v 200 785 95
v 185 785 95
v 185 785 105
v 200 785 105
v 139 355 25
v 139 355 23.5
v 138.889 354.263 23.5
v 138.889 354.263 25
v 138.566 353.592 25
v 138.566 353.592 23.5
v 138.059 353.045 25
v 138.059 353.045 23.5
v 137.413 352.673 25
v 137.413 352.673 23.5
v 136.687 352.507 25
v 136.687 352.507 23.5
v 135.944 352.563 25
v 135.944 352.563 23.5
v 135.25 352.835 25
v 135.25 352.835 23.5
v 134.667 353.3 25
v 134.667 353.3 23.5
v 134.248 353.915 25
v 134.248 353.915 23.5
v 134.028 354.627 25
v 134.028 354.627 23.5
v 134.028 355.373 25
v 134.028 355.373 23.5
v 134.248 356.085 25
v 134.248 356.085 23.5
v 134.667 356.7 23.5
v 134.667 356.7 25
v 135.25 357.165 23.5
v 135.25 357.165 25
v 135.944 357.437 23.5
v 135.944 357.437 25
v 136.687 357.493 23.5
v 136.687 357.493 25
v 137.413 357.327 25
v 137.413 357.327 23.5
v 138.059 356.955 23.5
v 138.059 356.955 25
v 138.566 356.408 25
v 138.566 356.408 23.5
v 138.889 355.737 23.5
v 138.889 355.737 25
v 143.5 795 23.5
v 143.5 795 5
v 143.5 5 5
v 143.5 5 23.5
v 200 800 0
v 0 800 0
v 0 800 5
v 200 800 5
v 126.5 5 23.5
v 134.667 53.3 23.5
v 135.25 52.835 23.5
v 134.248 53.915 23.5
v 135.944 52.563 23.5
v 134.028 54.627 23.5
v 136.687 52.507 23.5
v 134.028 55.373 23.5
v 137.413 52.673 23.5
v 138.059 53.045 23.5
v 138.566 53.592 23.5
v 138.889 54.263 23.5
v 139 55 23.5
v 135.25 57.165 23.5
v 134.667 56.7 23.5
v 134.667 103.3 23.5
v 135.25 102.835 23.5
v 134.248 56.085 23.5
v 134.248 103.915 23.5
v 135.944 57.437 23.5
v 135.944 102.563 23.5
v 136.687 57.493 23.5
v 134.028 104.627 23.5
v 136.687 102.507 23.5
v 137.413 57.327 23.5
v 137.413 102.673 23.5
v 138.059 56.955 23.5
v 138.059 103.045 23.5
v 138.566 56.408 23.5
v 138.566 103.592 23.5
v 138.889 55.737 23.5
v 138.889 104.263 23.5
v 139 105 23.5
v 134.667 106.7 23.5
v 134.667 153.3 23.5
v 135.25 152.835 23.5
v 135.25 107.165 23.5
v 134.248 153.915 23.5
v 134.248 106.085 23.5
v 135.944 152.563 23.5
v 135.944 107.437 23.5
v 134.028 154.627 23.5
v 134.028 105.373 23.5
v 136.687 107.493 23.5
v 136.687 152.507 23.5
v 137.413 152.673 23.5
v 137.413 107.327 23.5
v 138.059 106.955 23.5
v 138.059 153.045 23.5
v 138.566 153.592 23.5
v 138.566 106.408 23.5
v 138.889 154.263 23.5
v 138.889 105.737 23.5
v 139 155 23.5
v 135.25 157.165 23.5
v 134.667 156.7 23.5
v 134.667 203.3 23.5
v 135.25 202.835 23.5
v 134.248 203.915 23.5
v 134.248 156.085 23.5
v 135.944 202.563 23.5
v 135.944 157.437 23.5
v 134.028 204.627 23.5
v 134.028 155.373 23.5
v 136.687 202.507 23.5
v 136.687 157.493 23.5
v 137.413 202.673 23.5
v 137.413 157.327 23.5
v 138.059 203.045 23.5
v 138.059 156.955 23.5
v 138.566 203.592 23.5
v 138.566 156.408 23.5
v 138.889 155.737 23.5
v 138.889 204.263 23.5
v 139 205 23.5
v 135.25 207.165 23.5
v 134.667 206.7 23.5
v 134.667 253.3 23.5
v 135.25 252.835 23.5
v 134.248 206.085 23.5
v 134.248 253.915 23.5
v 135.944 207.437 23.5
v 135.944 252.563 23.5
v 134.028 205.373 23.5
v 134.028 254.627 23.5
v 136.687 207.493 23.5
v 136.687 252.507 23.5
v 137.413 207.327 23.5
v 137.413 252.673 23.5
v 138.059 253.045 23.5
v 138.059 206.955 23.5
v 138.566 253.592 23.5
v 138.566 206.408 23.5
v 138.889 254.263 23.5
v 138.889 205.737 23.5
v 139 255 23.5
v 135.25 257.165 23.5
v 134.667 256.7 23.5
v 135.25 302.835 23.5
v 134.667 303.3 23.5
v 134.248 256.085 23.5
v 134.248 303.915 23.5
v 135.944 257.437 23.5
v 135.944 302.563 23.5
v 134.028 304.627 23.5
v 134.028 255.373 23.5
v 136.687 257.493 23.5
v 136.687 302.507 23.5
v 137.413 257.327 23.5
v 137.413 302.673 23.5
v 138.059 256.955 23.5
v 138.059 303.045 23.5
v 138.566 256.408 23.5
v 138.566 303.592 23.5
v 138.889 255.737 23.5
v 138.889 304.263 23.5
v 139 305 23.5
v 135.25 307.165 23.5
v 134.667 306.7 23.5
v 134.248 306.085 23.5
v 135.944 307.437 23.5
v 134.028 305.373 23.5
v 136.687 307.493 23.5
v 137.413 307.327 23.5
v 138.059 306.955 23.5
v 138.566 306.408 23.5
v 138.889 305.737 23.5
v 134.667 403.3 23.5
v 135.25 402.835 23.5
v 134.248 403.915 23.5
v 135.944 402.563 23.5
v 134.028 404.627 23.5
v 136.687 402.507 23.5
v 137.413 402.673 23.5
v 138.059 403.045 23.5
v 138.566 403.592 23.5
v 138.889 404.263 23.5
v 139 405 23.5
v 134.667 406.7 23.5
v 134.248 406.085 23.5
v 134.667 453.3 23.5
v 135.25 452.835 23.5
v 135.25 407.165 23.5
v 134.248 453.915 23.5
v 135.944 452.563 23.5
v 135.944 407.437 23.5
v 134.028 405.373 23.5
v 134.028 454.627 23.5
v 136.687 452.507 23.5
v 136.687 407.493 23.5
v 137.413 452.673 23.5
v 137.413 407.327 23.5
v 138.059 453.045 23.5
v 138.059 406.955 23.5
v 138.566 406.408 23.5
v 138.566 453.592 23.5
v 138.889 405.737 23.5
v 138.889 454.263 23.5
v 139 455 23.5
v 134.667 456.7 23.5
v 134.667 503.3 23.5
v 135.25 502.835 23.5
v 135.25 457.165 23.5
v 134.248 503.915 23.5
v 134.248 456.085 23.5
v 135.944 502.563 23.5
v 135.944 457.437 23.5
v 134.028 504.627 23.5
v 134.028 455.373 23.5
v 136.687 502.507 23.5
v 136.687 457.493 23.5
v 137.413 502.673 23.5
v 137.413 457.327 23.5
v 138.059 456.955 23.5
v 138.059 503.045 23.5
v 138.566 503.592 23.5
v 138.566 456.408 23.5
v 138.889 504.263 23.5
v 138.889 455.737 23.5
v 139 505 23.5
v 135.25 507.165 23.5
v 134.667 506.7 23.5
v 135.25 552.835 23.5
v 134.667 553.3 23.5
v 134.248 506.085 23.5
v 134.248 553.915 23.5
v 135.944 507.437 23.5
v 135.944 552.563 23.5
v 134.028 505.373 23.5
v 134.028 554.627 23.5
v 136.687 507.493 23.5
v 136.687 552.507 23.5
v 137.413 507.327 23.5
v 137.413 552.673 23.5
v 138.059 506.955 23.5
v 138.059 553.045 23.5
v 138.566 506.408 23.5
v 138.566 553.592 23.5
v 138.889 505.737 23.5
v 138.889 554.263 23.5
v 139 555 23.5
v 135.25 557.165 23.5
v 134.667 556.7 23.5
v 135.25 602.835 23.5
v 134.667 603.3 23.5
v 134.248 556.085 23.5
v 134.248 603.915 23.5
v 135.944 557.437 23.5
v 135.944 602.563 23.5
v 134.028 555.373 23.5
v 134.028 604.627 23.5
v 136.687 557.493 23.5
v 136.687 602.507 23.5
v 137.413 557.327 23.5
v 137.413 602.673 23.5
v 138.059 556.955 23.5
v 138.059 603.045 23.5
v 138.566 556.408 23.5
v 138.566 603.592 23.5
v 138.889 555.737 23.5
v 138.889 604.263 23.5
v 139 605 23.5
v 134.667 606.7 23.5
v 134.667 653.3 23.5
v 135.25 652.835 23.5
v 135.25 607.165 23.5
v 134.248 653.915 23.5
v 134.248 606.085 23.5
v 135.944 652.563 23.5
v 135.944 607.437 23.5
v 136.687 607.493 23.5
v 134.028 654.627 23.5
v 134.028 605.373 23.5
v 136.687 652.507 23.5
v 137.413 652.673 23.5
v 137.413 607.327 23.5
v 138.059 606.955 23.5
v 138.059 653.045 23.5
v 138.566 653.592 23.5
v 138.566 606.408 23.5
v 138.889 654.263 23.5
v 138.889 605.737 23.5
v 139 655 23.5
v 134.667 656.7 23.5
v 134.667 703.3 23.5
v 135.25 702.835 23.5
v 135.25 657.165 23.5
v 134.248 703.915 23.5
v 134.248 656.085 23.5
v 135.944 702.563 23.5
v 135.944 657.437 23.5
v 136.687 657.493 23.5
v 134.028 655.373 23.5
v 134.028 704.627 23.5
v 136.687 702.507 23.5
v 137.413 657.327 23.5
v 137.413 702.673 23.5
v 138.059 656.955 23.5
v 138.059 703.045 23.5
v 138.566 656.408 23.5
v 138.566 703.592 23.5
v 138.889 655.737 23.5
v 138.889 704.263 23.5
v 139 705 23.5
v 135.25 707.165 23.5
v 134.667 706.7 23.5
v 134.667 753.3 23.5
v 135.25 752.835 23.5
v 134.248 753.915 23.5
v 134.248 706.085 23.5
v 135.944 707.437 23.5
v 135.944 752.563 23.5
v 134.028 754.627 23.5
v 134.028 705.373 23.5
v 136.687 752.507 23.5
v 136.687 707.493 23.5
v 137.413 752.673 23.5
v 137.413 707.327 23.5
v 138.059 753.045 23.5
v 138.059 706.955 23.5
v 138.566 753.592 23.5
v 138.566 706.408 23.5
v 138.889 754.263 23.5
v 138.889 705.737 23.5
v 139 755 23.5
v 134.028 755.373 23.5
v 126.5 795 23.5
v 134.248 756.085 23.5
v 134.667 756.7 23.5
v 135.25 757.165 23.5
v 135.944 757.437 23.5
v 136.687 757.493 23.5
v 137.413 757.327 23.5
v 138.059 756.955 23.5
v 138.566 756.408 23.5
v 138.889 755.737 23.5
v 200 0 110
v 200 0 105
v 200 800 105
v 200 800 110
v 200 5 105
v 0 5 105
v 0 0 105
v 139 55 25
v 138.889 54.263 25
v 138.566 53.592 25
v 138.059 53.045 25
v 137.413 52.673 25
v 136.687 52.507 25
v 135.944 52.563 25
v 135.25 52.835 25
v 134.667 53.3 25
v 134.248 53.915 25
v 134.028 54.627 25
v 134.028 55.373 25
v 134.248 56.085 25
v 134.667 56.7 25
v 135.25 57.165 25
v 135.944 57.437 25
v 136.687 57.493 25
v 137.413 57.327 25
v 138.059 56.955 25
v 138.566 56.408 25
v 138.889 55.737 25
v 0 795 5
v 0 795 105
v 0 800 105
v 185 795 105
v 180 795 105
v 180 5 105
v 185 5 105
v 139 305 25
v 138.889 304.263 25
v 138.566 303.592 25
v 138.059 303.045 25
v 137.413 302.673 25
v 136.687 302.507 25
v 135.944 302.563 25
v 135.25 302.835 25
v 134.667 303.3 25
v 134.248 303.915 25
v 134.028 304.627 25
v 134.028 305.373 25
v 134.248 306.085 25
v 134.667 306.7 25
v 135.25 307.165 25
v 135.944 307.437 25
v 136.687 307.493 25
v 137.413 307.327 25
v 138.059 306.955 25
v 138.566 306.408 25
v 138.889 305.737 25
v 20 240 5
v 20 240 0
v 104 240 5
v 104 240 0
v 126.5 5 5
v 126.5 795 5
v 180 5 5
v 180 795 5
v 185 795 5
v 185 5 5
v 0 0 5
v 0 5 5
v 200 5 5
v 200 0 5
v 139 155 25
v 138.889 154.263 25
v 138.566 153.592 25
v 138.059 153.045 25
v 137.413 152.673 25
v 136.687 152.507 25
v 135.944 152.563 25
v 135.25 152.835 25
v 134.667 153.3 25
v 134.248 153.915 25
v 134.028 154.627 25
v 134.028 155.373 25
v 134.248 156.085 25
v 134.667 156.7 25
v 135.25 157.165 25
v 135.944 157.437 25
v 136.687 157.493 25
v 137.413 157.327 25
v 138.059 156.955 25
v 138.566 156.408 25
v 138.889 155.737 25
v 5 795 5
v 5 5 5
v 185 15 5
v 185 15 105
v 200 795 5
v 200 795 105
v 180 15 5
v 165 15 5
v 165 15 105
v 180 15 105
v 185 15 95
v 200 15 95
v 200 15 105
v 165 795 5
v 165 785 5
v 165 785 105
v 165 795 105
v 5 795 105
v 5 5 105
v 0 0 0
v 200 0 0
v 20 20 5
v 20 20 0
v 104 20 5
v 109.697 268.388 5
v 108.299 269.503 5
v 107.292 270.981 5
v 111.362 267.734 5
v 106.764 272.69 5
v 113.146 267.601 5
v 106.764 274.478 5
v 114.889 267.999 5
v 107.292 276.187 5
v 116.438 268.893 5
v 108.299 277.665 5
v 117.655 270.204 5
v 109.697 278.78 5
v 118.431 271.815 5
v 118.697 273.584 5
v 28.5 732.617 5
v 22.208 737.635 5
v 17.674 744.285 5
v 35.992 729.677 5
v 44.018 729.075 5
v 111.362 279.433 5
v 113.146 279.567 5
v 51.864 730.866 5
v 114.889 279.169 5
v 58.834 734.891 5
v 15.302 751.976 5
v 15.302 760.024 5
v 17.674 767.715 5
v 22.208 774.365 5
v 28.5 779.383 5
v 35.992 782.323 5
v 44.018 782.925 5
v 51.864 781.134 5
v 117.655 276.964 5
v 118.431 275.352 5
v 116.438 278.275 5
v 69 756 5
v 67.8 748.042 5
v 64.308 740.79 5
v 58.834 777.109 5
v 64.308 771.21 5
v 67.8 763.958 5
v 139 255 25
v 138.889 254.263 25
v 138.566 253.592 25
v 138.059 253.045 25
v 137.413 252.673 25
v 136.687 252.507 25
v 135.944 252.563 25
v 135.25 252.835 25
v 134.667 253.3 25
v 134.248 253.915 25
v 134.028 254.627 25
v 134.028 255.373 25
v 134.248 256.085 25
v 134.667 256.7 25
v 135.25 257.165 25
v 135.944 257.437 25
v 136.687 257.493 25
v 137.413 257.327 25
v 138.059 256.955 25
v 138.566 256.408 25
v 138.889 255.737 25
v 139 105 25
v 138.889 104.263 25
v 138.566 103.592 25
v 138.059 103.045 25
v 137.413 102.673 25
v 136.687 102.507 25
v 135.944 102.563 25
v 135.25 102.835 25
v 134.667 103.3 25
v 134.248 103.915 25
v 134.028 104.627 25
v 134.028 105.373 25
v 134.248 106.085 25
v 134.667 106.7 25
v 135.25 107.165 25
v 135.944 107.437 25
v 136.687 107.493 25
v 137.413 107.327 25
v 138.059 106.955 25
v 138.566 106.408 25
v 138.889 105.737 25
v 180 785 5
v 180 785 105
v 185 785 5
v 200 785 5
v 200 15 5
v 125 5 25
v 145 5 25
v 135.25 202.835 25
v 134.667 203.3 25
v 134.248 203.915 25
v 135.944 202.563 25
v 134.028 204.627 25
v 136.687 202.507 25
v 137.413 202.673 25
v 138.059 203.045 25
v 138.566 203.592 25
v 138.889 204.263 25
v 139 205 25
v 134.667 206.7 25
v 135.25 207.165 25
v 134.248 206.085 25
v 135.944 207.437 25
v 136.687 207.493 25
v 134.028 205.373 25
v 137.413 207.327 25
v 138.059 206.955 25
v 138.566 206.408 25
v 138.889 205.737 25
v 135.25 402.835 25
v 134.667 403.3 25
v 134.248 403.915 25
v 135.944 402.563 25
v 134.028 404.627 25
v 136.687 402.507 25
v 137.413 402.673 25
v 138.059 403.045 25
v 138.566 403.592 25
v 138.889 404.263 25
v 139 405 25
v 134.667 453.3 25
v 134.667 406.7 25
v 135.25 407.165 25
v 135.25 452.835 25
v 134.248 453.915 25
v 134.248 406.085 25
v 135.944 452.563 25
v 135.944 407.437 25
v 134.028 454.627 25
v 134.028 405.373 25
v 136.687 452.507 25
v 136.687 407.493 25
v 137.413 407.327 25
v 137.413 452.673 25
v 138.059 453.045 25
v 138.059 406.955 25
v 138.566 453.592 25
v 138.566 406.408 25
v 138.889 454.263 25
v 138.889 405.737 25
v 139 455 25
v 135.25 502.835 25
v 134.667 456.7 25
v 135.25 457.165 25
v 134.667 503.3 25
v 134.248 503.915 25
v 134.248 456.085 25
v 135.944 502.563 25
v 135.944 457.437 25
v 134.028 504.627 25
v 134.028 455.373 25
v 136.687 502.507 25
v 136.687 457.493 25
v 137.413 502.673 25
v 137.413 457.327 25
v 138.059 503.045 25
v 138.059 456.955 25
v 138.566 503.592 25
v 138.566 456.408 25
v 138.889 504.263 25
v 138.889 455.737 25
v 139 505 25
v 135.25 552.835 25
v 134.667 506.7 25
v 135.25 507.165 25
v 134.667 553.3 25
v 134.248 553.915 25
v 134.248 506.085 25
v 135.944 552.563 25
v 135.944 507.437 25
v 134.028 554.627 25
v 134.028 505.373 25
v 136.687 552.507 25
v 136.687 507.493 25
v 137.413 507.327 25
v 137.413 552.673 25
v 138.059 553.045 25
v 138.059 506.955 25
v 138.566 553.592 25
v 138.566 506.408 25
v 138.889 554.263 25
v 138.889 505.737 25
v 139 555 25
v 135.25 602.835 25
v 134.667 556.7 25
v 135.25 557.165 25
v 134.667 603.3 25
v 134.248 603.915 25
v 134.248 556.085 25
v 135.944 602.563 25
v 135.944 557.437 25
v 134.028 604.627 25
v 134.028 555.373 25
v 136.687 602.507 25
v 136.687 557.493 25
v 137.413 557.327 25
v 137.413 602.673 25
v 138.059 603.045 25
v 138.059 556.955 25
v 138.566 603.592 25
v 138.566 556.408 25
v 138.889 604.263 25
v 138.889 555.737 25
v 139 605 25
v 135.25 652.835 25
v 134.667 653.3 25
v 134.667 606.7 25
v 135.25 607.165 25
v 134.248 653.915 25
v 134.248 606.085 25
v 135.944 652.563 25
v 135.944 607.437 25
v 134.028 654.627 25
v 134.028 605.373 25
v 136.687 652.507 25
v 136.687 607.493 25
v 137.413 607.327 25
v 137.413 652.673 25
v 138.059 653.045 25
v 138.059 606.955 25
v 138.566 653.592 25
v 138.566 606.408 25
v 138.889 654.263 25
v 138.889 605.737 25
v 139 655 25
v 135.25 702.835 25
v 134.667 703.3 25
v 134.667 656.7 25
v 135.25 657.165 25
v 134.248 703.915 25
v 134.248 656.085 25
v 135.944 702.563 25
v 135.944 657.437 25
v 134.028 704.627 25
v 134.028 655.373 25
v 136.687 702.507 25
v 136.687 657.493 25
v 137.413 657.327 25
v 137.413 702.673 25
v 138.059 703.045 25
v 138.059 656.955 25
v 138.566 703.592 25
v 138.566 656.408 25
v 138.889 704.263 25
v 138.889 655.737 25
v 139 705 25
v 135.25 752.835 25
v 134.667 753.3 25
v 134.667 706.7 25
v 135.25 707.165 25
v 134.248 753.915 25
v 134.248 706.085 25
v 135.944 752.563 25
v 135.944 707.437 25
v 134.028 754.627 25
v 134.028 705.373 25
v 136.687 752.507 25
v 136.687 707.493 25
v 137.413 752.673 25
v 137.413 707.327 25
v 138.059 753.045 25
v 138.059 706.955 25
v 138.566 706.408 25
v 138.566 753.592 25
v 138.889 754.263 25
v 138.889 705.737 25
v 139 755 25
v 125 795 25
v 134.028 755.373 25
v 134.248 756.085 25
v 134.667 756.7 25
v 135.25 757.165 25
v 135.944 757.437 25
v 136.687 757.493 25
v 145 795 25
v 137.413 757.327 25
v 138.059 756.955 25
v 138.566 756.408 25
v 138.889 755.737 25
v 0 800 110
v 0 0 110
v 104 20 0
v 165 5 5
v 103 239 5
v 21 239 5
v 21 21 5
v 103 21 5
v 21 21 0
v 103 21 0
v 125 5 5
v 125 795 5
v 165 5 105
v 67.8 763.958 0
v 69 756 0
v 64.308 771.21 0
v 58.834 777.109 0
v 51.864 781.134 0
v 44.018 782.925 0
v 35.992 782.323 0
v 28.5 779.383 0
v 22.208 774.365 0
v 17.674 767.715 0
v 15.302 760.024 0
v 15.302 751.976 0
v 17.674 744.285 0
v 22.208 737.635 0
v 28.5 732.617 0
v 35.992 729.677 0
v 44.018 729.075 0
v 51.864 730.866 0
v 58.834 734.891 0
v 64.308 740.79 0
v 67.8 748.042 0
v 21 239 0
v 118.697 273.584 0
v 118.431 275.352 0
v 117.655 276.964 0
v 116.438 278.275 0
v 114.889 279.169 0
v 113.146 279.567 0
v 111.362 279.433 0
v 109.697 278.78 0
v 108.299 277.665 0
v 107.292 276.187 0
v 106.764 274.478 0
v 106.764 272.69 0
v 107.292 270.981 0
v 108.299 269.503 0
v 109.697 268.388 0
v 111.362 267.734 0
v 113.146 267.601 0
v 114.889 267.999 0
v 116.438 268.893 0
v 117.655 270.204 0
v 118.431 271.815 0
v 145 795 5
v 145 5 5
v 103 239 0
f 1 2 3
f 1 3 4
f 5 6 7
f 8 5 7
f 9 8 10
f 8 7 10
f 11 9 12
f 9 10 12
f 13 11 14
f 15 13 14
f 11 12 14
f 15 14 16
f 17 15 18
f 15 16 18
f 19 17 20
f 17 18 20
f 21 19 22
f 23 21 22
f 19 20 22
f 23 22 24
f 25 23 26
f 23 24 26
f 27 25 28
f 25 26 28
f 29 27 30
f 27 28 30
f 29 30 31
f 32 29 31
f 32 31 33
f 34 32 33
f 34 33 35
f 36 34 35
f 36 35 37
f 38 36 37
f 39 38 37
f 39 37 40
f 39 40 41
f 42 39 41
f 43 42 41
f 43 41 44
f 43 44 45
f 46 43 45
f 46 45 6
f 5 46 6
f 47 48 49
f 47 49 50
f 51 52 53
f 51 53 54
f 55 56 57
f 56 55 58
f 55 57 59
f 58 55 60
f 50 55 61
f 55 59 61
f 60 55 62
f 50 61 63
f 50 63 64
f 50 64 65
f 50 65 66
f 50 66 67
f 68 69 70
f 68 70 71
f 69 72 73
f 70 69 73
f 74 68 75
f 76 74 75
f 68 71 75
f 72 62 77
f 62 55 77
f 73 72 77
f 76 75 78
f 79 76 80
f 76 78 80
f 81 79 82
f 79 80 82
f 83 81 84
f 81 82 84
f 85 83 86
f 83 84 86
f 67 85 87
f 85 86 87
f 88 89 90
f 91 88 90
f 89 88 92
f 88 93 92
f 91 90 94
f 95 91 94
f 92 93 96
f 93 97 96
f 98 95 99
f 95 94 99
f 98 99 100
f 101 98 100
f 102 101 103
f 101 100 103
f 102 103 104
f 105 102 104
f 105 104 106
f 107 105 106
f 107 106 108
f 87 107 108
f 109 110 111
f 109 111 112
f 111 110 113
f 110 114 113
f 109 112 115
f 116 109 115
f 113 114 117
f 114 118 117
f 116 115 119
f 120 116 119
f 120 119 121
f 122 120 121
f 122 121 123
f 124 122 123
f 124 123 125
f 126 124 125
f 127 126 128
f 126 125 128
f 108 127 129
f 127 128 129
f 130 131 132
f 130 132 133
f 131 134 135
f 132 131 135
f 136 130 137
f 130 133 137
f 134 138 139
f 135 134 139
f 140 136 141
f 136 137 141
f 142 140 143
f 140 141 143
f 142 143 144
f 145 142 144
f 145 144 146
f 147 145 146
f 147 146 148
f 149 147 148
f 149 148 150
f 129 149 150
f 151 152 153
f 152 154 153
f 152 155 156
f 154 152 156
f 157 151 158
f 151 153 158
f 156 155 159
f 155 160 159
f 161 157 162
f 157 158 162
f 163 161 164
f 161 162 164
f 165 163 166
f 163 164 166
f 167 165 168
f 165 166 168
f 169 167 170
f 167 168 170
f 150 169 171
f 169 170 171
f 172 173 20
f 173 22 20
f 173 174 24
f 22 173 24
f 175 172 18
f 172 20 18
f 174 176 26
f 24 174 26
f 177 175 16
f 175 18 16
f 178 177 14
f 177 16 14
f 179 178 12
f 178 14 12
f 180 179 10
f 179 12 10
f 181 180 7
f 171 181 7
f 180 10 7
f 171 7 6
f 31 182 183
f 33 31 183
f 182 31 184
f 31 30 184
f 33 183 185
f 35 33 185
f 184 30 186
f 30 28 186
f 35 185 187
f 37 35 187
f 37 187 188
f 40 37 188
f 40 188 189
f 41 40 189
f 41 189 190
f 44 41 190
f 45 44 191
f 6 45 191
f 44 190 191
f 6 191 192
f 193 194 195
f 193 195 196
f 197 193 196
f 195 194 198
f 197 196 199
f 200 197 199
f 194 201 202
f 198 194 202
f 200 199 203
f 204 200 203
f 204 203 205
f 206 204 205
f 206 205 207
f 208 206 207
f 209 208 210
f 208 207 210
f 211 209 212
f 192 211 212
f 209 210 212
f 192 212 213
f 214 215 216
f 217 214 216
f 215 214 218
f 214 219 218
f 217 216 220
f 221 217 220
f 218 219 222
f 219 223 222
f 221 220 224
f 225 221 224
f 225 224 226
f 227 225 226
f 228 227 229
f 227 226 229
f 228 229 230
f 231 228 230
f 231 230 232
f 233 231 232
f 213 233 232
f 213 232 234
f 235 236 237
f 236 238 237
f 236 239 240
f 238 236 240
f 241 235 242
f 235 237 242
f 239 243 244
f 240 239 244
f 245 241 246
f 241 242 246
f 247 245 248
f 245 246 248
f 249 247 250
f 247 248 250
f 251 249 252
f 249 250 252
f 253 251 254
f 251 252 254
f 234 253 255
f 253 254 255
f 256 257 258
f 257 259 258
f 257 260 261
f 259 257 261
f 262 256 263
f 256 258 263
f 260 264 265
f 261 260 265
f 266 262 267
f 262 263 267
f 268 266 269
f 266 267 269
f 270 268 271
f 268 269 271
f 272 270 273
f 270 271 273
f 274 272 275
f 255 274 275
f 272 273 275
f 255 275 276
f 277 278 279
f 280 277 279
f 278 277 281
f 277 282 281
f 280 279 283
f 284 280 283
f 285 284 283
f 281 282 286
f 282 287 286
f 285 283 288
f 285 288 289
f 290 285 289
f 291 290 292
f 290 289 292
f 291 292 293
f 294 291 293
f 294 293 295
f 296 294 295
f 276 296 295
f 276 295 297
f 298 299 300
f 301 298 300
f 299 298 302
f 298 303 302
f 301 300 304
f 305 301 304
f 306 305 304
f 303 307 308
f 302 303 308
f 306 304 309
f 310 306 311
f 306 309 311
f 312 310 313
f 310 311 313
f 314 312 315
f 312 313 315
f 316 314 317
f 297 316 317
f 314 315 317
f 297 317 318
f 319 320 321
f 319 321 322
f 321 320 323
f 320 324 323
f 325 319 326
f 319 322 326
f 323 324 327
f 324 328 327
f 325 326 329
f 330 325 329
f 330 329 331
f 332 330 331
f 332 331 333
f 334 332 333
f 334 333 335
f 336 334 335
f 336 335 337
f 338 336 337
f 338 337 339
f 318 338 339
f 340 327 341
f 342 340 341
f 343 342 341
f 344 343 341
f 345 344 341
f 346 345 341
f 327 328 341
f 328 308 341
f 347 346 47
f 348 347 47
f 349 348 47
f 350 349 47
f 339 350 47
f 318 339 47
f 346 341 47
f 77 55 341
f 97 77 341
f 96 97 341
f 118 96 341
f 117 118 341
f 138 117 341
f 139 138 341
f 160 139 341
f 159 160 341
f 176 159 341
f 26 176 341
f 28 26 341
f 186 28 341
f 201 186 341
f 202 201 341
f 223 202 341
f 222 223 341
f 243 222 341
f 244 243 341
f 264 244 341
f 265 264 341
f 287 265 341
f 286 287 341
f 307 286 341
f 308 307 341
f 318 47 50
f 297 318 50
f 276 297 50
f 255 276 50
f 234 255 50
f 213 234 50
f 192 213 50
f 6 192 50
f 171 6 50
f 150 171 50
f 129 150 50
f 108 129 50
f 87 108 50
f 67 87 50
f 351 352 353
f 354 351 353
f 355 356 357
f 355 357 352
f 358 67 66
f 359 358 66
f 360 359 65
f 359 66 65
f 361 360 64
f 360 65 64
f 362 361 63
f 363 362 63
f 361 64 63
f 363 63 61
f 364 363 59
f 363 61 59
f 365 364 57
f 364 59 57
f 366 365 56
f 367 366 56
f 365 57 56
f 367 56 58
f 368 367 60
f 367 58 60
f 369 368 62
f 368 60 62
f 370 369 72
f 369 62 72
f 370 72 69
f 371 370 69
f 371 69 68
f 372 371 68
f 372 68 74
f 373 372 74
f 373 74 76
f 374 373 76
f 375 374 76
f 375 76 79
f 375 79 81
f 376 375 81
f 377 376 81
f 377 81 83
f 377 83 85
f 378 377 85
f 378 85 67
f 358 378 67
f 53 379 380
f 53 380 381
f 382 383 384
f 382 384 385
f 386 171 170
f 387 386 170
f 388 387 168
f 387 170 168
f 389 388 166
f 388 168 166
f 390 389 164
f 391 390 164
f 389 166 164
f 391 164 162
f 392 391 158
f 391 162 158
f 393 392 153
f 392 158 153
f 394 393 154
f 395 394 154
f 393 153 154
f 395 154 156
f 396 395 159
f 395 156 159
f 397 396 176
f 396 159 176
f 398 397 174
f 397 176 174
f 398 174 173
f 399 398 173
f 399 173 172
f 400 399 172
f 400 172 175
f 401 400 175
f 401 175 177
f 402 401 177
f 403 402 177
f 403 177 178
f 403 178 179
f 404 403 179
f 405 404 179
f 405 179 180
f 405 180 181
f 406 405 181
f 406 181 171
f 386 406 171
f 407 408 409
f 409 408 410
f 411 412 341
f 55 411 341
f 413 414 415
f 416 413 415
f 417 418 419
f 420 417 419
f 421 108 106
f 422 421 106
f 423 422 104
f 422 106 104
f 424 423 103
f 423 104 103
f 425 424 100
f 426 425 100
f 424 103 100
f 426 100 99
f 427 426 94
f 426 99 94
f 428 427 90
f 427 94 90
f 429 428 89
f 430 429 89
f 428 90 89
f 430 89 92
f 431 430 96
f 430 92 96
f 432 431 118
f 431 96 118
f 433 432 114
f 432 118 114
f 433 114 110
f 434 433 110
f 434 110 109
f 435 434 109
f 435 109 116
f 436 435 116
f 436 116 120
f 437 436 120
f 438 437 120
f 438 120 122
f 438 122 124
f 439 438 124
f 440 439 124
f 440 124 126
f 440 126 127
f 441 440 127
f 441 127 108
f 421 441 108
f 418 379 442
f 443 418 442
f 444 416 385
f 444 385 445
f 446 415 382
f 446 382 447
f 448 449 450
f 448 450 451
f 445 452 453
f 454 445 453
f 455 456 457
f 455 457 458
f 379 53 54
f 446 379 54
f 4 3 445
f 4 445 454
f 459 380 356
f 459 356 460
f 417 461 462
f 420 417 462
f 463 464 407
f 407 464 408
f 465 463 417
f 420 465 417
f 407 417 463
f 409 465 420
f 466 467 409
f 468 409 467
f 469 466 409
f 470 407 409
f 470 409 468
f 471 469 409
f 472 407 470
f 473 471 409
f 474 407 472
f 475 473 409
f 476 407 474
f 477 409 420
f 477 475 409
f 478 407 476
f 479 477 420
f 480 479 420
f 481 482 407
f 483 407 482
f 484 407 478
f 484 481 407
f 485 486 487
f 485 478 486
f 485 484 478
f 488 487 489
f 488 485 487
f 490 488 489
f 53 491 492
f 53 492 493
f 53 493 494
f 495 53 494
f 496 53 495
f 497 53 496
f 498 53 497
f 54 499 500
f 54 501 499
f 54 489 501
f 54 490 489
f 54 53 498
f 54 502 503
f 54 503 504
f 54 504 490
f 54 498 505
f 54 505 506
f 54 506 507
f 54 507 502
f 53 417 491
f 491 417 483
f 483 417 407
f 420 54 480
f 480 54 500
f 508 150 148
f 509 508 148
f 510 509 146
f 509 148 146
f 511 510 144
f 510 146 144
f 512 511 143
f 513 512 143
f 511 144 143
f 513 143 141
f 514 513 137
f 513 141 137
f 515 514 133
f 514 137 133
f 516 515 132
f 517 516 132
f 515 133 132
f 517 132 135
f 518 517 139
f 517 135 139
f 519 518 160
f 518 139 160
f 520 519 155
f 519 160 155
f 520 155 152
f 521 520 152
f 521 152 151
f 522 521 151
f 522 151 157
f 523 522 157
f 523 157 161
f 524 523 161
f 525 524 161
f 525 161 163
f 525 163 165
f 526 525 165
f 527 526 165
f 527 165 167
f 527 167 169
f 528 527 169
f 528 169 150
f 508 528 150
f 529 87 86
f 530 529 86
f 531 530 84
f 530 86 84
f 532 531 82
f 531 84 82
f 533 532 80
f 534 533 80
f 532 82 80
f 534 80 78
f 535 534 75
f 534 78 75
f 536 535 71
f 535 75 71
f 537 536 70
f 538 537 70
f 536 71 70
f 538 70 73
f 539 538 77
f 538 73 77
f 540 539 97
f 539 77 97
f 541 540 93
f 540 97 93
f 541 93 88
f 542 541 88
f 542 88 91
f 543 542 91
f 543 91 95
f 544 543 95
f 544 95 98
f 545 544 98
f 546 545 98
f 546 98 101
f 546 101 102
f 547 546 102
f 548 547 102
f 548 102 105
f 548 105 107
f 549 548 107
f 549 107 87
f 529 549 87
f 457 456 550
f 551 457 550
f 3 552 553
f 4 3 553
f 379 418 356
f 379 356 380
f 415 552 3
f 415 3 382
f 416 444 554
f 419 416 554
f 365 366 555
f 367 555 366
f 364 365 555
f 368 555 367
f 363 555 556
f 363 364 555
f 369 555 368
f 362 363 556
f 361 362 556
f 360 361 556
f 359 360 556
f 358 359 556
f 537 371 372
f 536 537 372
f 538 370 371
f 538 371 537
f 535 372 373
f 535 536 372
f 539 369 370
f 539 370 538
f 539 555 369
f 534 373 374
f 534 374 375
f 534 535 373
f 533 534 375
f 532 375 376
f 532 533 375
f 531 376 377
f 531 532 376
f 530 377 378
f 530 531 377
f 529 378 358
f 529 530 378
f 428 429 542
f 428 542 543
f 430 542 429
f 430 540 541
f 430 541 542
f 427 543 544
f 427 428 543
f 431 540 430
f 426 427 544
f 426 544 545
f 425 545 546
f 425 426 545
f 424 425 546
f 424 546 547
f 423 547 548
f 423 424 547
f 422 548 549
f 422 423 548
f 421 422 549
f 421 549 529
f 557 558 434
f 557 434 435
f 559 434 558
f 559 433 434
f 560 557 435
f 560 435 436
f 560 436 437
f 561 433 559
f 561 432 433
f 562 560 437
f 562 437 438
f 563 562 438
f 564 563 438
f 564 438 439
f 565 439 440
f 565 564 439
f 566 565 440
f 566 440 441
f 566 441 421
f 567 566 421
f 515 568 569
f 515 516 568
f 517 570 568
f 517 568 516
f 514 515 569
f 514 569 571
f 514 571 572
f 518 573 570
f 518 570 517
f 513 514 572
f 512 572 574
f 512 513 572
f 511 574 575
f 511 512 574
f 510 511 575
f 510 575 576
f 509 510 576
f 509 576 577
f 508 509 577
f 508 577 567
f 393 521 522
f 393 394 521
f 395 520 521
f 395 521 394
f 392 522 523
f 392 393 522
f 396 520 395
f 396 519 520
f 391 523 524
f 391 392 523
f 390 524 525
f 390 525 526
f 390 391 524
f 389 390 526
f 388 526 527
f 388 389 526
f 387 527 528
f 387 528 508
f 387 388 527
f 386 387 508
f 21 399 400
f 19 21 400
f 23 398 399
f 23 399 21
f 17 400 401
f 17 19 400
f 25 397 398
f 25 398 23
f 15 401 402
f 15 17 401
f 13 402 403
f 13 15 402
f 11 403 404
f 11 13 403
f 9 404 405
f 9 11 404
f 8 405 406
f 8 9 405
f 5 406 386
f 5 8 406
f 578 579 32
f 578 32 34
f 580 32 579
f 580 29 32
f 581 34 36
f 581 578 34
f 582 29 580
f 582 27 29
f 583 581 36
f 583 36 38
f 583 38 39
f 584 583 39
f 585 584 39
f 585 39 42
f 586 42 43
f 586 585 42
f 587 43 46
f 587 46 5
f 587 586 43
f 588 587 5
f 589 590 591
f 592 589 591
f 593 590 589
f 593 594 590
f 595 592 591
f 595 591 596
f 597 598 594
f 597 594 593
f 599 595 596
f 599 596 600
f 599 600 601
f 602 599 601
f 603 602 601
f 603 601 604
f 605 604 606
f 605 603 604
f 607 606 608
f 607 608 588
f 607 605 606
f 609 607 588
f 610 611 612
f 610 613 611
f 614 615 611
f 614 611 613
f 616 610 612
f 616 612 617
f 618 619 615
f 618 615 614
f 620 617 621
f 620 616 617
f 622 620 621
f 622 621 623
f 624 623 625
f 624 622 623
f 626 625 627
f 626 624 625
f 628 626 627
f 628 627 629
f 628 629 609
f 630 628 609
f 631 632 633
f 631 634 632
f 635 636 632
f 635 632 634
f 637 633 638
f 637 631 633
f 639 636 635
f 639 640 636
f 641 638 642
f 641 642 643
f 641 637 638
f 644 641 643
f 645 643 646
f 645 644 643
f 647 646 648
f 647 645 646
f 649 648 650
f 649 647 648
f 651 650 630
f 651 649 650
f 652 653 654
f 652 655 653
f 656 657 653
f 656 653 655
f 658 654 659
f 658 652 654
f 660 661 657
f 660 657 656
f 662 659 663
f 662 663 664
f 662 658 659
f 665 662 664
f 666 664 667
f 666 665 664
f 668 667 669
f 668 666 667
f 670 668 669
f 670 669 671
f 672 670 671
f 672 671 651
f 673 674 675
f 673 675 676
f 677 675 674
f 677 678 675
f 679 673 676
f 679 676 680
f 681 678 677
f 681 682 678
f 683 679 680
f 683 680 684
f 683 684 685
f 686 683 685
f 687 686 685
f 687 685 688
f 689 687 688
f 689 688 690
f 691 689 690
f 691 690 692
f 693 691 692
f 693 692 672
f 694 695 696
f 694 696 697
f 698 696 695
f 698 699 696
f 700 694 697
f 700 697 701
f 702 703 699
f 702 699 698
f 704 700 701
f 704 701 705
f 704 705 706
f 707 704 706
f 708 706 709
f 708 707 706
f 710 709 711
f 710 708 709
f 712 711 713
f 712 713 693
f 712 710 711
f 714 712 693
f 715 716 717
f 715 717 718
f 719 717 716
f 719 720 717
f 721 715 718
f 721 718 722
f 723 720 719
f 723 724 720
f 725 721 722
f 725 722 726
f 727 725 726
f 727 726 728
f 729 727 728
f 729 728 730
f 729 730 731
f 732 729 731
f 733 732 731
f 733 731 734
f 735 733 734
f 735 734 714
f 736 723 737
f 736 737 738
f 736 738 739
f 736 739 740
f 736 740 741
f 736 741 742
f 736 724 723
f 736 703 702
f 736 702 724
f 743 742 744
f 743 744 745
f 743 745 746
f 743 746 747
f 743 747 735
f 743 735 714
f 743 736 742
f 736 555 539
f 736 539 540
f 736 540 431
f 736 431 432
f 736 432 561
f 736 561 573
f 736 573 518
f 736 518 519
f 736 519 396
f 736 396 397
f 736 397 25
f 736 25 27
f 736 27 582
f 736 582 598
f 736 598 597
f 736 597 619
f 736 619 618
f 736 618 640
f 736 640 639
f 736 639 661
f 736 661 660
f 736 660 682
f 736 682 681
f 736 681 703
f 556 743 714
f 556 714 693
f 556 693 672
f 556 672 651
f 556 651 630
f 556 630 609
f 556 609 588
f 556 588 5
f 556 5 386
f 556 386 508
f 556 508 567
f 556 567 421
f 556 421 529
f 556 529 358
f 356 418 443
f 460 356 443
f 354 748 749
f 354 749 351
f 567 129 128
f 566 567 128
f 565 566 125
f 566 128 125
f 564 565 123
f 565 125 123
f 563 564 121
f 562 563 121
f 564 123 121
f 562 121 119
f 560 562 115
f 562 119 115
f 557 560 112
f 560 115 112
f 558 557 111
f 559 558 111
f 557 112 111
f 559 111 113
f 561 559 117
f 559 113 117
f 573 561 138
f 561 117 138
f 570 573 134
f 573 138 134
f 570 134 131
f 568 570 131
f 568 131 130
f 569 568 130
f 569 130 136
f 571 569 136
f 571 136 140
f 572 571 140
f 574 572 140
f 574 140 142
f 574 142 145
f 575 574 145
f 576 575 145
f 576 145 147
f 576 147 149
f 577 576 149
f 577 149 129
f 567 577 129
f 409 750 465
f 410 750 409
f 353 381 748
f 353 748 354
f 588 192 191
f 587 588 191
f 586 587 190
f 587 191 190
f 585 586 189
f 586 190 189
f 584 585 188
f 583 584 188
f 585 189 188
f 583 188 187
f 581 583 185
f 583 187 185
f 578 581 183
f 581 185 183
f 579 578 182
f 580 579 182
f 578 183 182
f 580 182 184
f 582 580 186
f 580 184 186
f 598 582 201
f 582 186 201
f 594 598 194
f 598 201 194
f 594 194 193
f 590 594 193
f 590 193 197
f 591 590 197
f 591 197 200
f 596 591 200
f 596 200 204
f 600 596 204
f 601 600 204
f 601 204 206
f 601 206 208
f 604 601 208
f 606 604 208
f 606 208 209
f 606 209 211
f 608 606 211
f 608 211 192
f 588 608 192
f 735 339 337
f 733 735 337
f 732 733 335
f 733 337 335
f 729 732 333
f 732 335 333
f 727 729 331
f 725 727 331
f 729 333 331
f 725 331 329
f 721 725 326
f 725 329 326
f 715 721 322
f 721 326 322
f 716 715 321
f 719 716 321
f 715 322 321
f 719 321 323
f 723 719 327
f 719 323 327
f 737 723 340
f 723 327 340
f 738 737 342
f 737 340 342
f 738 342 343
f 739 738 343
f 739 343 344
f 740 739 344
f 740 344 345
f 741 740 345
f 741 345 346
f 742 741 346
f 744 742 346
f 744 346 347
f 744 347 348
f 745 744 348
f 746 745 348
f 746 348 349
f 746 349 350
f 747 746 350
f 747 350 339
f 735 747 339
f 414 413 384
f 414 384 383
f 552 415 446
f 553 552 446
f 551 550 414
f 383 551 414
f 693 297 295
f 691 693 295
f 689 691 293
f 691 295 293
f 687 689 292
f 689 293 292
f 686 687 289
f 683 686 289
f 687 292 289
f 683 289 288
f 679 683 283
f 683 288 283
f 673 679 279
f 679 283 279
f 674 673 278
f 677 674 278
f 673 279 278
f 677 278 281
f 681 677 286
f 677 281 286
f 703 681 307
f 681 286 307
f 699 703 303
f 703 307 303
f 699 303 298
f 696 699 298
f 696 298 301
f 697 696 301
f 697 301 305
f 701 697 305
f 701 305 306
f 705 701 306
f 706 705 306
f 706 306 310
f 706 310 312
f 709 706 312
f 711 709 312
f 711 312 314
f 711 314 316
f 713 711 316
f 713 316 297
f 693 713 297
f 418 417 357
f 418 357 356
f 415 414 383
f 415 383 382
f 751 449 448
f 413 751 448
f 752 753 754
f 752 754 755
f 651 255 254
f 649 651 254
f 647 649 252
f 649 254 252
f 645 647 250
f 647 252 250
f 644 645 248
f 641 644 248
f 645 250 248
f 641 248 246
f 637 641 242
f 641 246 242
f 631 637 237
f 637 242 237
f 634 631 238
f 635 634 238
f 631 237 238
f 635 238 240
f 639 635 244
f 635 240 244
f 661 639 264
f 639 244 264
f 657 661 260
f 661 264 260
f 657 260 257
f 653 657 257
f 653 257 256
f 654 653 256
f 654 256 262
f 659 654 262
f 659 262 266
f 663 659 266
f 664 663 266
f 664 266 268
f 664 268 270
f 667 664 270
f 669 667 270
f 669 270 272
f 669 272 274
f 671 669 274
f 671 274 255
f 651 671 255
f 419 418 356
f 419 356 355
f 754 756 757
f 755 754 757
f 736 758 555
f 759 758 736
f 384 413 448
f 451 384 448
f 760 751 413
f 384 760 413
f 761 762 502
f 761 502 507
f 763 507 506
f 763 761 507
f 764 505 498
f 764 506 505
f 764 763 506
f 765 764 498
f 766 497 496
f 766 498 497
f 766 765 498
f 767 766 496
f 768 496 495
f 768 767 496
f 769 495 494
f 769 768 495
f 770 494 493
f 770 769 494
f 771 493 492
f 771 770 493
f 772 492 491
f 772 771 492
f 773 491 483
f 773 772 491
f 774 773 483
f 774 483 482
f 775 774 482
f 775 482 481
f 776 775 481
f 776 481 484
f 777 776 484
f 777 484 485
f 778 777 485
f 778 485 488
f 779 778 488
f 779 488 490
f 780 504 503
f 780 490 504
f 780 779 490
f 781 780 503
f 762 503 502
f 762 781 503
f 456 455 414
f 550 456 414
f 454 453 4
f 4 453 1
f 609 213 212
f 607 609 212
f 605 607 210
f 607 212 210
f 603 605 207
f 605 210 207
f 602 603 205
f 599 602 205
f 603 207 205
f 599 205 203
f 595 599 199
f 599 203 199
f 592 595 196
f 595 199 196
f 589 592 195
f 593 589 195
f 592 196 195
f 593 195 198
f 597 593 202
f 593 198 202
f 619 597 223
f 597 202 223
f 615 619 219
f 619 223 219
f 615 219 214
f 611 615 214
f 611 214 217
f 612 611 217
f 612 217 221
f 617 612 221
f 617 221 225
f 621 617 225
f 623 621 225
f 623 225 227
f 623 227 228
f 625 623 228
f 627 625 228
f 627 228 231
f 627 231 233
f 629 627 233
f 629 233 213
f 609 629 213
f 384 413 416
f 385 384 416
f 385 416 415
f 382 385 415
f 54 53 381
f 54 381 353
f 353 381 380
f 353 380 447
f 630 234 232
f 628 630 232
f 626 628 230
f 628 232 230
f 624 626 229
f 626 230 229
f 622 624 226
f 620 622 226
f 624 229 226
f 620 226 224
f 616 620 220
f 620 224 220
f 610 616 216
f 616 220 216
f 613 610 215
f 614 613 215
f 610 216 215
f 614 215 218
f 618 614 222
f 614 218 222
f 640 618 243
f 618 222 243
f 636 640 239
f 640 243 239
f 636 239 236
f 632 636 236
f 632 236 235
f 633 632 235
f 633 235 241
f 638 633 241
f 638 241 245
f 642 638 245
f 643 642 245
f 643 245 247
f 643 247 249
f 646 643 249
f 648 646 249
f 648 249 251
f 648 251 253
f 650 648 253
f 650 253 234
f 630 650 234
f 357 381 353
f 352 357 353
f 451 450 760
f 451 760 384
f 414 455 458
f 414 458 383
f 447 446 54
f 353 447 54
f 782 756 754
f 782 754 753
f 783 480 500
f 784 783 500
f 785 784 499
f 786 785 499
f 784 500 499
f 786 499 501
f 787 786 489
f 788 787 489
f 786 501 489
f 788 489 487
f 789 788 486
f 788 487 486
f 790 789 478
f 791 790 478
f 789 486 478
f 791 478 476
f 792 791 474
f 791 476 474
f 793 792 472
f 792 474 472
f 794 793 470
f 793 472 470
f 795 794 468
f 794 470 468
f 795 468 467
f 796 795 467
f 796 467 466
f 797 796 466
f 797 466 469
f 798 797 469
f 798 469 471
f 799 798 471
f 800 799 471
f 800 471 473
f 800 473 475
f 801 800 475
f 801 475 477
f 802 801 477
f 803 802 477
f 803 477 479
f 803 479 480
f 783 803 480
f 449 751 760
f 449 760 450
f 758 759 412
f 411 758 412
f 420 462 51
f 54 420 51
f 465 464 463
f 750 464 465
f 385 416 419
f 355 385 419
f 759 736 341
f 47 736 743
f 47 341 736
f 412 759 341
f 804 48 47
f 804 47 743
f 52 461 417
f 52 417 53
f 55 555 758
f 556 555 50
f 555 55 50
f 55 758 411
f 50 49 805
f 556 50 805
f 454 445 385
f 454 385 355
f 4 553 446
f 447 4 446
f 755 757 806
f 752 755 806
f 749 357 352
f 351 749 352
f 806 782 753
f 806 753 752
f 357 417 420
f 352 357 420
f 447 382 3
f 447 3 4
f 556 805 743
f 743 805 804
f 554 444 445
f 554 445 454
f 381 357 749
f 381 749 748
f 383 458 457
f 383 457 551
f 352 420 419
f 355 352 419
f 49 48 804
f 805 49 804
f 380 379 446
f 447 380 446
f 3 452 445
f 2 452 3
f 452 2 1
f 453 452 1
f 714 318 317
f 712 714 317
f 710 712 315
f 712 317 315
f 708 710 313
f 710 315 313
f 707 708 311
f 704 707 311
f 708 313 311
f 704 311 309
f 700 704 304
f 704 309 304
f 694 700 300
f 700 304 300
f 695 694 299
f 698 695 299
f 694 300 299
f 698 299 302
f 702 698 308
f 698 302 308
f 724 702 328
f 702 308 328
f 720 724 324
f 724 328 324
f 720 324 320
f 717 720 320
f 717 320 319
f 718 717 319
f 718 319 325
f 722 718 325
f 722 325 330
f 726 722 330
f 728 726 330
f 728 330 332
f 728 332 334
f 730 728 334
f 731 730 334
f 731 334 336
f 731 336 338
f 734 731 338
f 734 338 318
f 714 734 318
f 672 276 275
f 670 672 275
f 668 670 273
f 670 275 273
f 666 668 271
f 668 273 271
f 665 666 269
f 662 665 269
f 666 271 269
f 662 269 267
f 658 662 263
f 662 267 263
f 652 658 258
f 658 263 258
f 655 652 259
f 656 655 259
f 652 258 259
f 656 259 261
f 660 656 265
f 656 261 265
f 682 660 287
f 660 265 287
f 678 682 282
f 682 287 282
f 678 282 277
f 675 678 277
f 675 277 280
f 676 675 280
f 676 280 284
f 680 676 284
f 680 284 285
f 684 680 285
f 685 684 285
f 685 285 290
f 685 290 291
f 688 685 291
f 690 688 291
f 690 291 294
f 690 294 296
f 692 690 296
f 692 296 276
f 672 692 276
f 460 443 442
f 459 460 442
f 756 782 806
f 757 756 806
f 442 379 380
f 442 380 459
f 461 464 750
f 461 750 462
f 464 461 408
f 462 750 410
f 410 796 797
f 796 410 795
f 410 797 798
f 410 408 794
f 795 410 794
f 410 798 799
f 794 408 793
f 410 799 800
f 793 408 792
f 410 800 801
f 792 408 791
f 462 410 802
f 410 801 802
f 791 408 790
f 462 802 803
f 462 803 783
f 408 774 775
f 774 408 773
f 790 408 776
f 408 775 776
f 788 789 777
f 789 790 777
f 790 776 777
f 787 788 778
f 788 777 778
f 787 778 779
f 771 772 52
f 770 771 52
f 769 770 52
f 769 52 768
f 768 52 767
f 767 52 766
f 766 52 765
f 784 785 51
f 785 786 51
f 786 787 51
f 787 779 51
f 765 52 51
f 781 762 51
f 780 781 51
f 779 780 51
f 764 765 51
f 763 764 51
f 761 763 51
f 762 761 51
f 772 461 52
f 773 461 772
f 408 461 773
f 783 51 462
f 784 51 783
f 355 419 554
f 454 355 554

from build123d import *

# Parameters (mm, degrees)
BOX_W          = 200
BOX_H          = 800
BOX_DEPTH      = 5
BOX002_W       = 5
BOX002_H       = 790
BOX002_DEPTH   = 100
BOX003_W       = 200
BOX003_H       = 5
BOX003_DEPTH   = 100
BOX004_W       = 200
BOX004_H       = 5
BOX004_DEPTH   = 100
BOX005_W       = 5
BOX005_H       = 790
BOX005_DEPTH   = 100
BOX007_W       = 15
BOX007_H       = 10
BOX007_DEPTH   = 100
BOX008_W       = 15
BOX008_H       = 10
BOX008_DEPTH   = 100
BOX009_W       = 15
BOX009_H       = 10
BOX009_DEPTH   = 100
BOX010_W       = 15
BOX010_H       = 10
BOX010_DEPTH   = 100
BOX006_W       = 20
BOX006_H       = 790
BOX006_DEPTH   = 20
BOX011_W       = 17
BOX011_H       = 18.5
BOX011_DEPTH   = 800
SKETCH_R       = 2.5
HOLE_DEPTH     = 25
BOX001_W       = 200
BOX001_H       = 800
BOX001_DEPTH   = 5
SKETCH001_R    = 6
HOLE001_DEPTH  = 31
CYLINDER_R     = 27
CYLINDER_DEPTH = 55
BOX012_W       = 84
BOX012_H       = 220
BOX012_DEPTH   = 20
BOX013_W       = 82
BOX013_H       = 218
BOX013_DEPTH   = 5
BOX014_W       = 15
BOX014_H       = 770
BOX014_DEPTH   = 10


with BuildPart() as roof:
    # Box → Box (new body)
    with BuildSketch(Plane.XY.offset(105)):
        with Locations((100, 400)):
            Rectangle(BOX_W, BOX_H)
    extrude(amount=BOX_DEPTH)


with BuildPart() as glass:
    # Box002 → Box002 (new body)
    with BuildSketch(Plane(origin=(180, 5, 5), x_dir=(1, 0, 0), z_dir=(0, 0, 1))):
        with Locations((2.5, 395)):
            Rectangle(BOX002_W, BOX002_H)
    extrude(amount=BOX002_DEPTH)


with BuildPart() as sideright:
    # Box003 → Box003 (new body)
    with BuildSketch(Plane.XY.offset(5)):
        with Locations((100, 2.5)):
            Rectangle(BOX003_W, BOX003_H)
    extrude(amount=BOX003_DEPTH)


with BuildPart() as sideleft:
    # Box004 → Box004 (new body)
    with BuildSketch(Plane(origin=(0, 795, 5), x_dir=(1, 0, 0), z_dir=(0, 0, 1))):
        with Locations((100, 2.5)):
            Rectangle(BOX004_W, BOX004_H)
    extrude(amount=BOX004_DEPTH)


with BuildPart() as back:
    # Box005 → Box005 (new body)
    with BuildSketch(Plane(origin=(0, 5, 5), x_dir=(1, 0, 0), z_dir=(0, 0, 1))):
        with Locations((2.5, 395)):
            Rectangle(BOX005_W, BOX005_H)
    extrude(amount=BOX005_DEPTH)


with BuildPart() as vbar1:
    # Box007 → Box007 (new body)
    with BuildSketch(Plane(origin=(185, 5, 5), x_dir=(1, 0, 0), z_dir=(0, 0, 1))):
        with Locations((7.5, 5)):
            Rectangle(BOX007_W, BOX007_H)
    extrude(amount=BOX007_DEPTH)


with BuildPart() as vbar2:
    # Box008 → Box008 (new body)
    with BuildSketch(Plane(origin=(165, 5, 5), x_dir=(1, 0, 0), z_dir=(0, 0, 1))):
        with Locations((7.5, 5)):
            Rectangle(BOX008_W, BOX008_H)
    extrude(amount=BOX008_DEPTH)


with BuildPart() as vbar3:
    # Box009 → Box009 (new body)
    with BuildSketch(Plane(origin=(185, 785, 5), x_dir=(1, 0, 0), z_dir=(0, 0, 1))):
        with Locations((7.5, 5)):
            Rectangle(BOX009_W, BOX009_H)
    extrude(amount=BOX009_DEPTH)


with BuildPart() as vbar4:
    # Box010 → Box010 (new body)
    with BuildSketch(Plane(origin=(165, 785, 5), x_dir=(1, 0, 0), z_dir=(0, 0, 1))):
        with Locations((7.5, 5)):
            Rectangle(BOX010_W, BOX010_H)
    extrude(amount=BOX010_DEPTH)


with BuildPart() as rail:
    # Box006 → Box006 (new body)
    with BuildSketch(Plane(origin=(145, 5, 85), x_dir=(1, 0, 0), z_dir=(0, 0, 1))):
        with Locations((10, 395)):
            Rectangle(BOX006_W, BOX006_H)
    extrude(amount=BOX006_DEPTH)


with BuildPart() as rail_1:
    # BaseFeature placement: moved
    add(rail.part.moved(Location((-145, -5, -85))))

    # Box011 → Box011 (cut)
    with BuildSketch(Plane(origin=(1.5, 800, 0), x_dir=(1, 0, 0), z_dir=(0, -1, 0))):
        with Locations((8.5, 9.25)):
            Rectangle(BOX011_W, BOX011_H)
    extrude(amount=BOX011_DEPTH, mode=Mode.SUBTRACT)

    # Sketch → Hole (cut)
    with BuildSketch(Plane(origin=(1.5, 800, 0), x_dir=(1, 0, 0), z_dir=(0, 0, -1))):
        with Locations((10, 50)):
            Circle(SKETCH_R)
        with Locations((10, 100)):
            Circle(SKETCH_R)
        with Locations((10, 150)):
            Circle(SKETCH_R)
        with Locations((10, 200)):
            Circle(SKETCH_R)
        with Locations((10, 250)):
            Circle(SKETCH_R)
        with Locations((10, 300)):
            Circle(SKETCH_R)
        with Locations((10, 350)):
            Circle(SKETCH_R)
        with Locations((10, 400)):
            Circle(SKETCH_R)
        with Locations((10, 450)):
            Circle(SKETCH_R)
        with Locations((10, 500)):
            Circle(SKETCH_R)
        with Locations((10, 550)):
            Circle(SKETCH_R)
        with Locations((10, 600)):
            Circle(SKETCH_R)
        with Locations((10, 650)):
            Circle(SKETCH_R)
        with Locations((10, 700)):
            Circle(SKETCH_R)
        with Locations((10, 750)):
            Circle(SKETCH_R)
    extrude(amount=-HOLE_DEPTH, mode=Mode.SUBTRACT)


with BuildPart() as rail_2:
    # Body placement: moved
    add(rail_1.part.moved(Location((125, 5, 5))))


with BuildPart() as floor:
    # Box001 → Box001 (new body)
    with BuildSketch(Plane.XY):
        with Locations((100, 400)):
            Rectangle(BOX001_W, BOX001_H)
    extrude(amount=BOX001_DEPTH)

    # Sketch001 (on Face6 of BaseFeature001) → Hole001 (cut)
    with BuildSketch(Plane.XY.offset(5)):
        with Locations((112.697332, 273.583833)):
            Circle(SKETCH001_R)
    extrude(amount=-HOLE001_DEPTH, mode=Mode.SUBTRACT)

    # Cylinder → Cylinder (cut)
    with BuildSketch(Plane(origin=(42, 756, -20), x_dir=(1, 0, 0), z_dir=(0, 0, 1))):
        Circle(CYLINDER_R)
    extrude(amount=CYLINDER_DEPTH, mode=Mode.SUBTRACT)

    # Box012 → Box012 (cut)
    with BuildSketch(Plane(origin=(20, 20, -10), x_dir=(1, 0, 0), z_dir=(0, 0, 1))):
        with Locations((42, 110)):
            Rectangle(BOX012_W, BOX012_H)
    extrude(amount=BOX012_DEPTH, mode=Mode.SUBTRACT)


with BuildPart() as door:
    # Box013 → Box013 (new body)
    with BuildSketch(Plane(origin=(21, 21, 0), x_dir=(1, 0, 0), z_dir=(0, 0, 1))):
        with Locations((41, 109)):
            Rectangle(BOX013_W, BOX013_H)
    extrude(amount=BOX013_DEPTH)


with BuildPart() as hbar:
    # Box014 → Box014 (new body)
    with BuildSketch(Plane(origin=(185, 15, 95), x_dir=(1, 0, 0), z_dir=(0, 0, 1))):
        with Locations((7.5, 385)):
            Rectangle(BOX014_W, BOX014_H)
    extrude(amount=BOX014_DEPTH)


solid = Compound([roof.part, glass.part, sideright.part, sideleft.part, back.part, vbar1.part, vbar2.part, vbar3.part, vbar4.part, rail_2.part, floor.part, door.part, hbar.part])
